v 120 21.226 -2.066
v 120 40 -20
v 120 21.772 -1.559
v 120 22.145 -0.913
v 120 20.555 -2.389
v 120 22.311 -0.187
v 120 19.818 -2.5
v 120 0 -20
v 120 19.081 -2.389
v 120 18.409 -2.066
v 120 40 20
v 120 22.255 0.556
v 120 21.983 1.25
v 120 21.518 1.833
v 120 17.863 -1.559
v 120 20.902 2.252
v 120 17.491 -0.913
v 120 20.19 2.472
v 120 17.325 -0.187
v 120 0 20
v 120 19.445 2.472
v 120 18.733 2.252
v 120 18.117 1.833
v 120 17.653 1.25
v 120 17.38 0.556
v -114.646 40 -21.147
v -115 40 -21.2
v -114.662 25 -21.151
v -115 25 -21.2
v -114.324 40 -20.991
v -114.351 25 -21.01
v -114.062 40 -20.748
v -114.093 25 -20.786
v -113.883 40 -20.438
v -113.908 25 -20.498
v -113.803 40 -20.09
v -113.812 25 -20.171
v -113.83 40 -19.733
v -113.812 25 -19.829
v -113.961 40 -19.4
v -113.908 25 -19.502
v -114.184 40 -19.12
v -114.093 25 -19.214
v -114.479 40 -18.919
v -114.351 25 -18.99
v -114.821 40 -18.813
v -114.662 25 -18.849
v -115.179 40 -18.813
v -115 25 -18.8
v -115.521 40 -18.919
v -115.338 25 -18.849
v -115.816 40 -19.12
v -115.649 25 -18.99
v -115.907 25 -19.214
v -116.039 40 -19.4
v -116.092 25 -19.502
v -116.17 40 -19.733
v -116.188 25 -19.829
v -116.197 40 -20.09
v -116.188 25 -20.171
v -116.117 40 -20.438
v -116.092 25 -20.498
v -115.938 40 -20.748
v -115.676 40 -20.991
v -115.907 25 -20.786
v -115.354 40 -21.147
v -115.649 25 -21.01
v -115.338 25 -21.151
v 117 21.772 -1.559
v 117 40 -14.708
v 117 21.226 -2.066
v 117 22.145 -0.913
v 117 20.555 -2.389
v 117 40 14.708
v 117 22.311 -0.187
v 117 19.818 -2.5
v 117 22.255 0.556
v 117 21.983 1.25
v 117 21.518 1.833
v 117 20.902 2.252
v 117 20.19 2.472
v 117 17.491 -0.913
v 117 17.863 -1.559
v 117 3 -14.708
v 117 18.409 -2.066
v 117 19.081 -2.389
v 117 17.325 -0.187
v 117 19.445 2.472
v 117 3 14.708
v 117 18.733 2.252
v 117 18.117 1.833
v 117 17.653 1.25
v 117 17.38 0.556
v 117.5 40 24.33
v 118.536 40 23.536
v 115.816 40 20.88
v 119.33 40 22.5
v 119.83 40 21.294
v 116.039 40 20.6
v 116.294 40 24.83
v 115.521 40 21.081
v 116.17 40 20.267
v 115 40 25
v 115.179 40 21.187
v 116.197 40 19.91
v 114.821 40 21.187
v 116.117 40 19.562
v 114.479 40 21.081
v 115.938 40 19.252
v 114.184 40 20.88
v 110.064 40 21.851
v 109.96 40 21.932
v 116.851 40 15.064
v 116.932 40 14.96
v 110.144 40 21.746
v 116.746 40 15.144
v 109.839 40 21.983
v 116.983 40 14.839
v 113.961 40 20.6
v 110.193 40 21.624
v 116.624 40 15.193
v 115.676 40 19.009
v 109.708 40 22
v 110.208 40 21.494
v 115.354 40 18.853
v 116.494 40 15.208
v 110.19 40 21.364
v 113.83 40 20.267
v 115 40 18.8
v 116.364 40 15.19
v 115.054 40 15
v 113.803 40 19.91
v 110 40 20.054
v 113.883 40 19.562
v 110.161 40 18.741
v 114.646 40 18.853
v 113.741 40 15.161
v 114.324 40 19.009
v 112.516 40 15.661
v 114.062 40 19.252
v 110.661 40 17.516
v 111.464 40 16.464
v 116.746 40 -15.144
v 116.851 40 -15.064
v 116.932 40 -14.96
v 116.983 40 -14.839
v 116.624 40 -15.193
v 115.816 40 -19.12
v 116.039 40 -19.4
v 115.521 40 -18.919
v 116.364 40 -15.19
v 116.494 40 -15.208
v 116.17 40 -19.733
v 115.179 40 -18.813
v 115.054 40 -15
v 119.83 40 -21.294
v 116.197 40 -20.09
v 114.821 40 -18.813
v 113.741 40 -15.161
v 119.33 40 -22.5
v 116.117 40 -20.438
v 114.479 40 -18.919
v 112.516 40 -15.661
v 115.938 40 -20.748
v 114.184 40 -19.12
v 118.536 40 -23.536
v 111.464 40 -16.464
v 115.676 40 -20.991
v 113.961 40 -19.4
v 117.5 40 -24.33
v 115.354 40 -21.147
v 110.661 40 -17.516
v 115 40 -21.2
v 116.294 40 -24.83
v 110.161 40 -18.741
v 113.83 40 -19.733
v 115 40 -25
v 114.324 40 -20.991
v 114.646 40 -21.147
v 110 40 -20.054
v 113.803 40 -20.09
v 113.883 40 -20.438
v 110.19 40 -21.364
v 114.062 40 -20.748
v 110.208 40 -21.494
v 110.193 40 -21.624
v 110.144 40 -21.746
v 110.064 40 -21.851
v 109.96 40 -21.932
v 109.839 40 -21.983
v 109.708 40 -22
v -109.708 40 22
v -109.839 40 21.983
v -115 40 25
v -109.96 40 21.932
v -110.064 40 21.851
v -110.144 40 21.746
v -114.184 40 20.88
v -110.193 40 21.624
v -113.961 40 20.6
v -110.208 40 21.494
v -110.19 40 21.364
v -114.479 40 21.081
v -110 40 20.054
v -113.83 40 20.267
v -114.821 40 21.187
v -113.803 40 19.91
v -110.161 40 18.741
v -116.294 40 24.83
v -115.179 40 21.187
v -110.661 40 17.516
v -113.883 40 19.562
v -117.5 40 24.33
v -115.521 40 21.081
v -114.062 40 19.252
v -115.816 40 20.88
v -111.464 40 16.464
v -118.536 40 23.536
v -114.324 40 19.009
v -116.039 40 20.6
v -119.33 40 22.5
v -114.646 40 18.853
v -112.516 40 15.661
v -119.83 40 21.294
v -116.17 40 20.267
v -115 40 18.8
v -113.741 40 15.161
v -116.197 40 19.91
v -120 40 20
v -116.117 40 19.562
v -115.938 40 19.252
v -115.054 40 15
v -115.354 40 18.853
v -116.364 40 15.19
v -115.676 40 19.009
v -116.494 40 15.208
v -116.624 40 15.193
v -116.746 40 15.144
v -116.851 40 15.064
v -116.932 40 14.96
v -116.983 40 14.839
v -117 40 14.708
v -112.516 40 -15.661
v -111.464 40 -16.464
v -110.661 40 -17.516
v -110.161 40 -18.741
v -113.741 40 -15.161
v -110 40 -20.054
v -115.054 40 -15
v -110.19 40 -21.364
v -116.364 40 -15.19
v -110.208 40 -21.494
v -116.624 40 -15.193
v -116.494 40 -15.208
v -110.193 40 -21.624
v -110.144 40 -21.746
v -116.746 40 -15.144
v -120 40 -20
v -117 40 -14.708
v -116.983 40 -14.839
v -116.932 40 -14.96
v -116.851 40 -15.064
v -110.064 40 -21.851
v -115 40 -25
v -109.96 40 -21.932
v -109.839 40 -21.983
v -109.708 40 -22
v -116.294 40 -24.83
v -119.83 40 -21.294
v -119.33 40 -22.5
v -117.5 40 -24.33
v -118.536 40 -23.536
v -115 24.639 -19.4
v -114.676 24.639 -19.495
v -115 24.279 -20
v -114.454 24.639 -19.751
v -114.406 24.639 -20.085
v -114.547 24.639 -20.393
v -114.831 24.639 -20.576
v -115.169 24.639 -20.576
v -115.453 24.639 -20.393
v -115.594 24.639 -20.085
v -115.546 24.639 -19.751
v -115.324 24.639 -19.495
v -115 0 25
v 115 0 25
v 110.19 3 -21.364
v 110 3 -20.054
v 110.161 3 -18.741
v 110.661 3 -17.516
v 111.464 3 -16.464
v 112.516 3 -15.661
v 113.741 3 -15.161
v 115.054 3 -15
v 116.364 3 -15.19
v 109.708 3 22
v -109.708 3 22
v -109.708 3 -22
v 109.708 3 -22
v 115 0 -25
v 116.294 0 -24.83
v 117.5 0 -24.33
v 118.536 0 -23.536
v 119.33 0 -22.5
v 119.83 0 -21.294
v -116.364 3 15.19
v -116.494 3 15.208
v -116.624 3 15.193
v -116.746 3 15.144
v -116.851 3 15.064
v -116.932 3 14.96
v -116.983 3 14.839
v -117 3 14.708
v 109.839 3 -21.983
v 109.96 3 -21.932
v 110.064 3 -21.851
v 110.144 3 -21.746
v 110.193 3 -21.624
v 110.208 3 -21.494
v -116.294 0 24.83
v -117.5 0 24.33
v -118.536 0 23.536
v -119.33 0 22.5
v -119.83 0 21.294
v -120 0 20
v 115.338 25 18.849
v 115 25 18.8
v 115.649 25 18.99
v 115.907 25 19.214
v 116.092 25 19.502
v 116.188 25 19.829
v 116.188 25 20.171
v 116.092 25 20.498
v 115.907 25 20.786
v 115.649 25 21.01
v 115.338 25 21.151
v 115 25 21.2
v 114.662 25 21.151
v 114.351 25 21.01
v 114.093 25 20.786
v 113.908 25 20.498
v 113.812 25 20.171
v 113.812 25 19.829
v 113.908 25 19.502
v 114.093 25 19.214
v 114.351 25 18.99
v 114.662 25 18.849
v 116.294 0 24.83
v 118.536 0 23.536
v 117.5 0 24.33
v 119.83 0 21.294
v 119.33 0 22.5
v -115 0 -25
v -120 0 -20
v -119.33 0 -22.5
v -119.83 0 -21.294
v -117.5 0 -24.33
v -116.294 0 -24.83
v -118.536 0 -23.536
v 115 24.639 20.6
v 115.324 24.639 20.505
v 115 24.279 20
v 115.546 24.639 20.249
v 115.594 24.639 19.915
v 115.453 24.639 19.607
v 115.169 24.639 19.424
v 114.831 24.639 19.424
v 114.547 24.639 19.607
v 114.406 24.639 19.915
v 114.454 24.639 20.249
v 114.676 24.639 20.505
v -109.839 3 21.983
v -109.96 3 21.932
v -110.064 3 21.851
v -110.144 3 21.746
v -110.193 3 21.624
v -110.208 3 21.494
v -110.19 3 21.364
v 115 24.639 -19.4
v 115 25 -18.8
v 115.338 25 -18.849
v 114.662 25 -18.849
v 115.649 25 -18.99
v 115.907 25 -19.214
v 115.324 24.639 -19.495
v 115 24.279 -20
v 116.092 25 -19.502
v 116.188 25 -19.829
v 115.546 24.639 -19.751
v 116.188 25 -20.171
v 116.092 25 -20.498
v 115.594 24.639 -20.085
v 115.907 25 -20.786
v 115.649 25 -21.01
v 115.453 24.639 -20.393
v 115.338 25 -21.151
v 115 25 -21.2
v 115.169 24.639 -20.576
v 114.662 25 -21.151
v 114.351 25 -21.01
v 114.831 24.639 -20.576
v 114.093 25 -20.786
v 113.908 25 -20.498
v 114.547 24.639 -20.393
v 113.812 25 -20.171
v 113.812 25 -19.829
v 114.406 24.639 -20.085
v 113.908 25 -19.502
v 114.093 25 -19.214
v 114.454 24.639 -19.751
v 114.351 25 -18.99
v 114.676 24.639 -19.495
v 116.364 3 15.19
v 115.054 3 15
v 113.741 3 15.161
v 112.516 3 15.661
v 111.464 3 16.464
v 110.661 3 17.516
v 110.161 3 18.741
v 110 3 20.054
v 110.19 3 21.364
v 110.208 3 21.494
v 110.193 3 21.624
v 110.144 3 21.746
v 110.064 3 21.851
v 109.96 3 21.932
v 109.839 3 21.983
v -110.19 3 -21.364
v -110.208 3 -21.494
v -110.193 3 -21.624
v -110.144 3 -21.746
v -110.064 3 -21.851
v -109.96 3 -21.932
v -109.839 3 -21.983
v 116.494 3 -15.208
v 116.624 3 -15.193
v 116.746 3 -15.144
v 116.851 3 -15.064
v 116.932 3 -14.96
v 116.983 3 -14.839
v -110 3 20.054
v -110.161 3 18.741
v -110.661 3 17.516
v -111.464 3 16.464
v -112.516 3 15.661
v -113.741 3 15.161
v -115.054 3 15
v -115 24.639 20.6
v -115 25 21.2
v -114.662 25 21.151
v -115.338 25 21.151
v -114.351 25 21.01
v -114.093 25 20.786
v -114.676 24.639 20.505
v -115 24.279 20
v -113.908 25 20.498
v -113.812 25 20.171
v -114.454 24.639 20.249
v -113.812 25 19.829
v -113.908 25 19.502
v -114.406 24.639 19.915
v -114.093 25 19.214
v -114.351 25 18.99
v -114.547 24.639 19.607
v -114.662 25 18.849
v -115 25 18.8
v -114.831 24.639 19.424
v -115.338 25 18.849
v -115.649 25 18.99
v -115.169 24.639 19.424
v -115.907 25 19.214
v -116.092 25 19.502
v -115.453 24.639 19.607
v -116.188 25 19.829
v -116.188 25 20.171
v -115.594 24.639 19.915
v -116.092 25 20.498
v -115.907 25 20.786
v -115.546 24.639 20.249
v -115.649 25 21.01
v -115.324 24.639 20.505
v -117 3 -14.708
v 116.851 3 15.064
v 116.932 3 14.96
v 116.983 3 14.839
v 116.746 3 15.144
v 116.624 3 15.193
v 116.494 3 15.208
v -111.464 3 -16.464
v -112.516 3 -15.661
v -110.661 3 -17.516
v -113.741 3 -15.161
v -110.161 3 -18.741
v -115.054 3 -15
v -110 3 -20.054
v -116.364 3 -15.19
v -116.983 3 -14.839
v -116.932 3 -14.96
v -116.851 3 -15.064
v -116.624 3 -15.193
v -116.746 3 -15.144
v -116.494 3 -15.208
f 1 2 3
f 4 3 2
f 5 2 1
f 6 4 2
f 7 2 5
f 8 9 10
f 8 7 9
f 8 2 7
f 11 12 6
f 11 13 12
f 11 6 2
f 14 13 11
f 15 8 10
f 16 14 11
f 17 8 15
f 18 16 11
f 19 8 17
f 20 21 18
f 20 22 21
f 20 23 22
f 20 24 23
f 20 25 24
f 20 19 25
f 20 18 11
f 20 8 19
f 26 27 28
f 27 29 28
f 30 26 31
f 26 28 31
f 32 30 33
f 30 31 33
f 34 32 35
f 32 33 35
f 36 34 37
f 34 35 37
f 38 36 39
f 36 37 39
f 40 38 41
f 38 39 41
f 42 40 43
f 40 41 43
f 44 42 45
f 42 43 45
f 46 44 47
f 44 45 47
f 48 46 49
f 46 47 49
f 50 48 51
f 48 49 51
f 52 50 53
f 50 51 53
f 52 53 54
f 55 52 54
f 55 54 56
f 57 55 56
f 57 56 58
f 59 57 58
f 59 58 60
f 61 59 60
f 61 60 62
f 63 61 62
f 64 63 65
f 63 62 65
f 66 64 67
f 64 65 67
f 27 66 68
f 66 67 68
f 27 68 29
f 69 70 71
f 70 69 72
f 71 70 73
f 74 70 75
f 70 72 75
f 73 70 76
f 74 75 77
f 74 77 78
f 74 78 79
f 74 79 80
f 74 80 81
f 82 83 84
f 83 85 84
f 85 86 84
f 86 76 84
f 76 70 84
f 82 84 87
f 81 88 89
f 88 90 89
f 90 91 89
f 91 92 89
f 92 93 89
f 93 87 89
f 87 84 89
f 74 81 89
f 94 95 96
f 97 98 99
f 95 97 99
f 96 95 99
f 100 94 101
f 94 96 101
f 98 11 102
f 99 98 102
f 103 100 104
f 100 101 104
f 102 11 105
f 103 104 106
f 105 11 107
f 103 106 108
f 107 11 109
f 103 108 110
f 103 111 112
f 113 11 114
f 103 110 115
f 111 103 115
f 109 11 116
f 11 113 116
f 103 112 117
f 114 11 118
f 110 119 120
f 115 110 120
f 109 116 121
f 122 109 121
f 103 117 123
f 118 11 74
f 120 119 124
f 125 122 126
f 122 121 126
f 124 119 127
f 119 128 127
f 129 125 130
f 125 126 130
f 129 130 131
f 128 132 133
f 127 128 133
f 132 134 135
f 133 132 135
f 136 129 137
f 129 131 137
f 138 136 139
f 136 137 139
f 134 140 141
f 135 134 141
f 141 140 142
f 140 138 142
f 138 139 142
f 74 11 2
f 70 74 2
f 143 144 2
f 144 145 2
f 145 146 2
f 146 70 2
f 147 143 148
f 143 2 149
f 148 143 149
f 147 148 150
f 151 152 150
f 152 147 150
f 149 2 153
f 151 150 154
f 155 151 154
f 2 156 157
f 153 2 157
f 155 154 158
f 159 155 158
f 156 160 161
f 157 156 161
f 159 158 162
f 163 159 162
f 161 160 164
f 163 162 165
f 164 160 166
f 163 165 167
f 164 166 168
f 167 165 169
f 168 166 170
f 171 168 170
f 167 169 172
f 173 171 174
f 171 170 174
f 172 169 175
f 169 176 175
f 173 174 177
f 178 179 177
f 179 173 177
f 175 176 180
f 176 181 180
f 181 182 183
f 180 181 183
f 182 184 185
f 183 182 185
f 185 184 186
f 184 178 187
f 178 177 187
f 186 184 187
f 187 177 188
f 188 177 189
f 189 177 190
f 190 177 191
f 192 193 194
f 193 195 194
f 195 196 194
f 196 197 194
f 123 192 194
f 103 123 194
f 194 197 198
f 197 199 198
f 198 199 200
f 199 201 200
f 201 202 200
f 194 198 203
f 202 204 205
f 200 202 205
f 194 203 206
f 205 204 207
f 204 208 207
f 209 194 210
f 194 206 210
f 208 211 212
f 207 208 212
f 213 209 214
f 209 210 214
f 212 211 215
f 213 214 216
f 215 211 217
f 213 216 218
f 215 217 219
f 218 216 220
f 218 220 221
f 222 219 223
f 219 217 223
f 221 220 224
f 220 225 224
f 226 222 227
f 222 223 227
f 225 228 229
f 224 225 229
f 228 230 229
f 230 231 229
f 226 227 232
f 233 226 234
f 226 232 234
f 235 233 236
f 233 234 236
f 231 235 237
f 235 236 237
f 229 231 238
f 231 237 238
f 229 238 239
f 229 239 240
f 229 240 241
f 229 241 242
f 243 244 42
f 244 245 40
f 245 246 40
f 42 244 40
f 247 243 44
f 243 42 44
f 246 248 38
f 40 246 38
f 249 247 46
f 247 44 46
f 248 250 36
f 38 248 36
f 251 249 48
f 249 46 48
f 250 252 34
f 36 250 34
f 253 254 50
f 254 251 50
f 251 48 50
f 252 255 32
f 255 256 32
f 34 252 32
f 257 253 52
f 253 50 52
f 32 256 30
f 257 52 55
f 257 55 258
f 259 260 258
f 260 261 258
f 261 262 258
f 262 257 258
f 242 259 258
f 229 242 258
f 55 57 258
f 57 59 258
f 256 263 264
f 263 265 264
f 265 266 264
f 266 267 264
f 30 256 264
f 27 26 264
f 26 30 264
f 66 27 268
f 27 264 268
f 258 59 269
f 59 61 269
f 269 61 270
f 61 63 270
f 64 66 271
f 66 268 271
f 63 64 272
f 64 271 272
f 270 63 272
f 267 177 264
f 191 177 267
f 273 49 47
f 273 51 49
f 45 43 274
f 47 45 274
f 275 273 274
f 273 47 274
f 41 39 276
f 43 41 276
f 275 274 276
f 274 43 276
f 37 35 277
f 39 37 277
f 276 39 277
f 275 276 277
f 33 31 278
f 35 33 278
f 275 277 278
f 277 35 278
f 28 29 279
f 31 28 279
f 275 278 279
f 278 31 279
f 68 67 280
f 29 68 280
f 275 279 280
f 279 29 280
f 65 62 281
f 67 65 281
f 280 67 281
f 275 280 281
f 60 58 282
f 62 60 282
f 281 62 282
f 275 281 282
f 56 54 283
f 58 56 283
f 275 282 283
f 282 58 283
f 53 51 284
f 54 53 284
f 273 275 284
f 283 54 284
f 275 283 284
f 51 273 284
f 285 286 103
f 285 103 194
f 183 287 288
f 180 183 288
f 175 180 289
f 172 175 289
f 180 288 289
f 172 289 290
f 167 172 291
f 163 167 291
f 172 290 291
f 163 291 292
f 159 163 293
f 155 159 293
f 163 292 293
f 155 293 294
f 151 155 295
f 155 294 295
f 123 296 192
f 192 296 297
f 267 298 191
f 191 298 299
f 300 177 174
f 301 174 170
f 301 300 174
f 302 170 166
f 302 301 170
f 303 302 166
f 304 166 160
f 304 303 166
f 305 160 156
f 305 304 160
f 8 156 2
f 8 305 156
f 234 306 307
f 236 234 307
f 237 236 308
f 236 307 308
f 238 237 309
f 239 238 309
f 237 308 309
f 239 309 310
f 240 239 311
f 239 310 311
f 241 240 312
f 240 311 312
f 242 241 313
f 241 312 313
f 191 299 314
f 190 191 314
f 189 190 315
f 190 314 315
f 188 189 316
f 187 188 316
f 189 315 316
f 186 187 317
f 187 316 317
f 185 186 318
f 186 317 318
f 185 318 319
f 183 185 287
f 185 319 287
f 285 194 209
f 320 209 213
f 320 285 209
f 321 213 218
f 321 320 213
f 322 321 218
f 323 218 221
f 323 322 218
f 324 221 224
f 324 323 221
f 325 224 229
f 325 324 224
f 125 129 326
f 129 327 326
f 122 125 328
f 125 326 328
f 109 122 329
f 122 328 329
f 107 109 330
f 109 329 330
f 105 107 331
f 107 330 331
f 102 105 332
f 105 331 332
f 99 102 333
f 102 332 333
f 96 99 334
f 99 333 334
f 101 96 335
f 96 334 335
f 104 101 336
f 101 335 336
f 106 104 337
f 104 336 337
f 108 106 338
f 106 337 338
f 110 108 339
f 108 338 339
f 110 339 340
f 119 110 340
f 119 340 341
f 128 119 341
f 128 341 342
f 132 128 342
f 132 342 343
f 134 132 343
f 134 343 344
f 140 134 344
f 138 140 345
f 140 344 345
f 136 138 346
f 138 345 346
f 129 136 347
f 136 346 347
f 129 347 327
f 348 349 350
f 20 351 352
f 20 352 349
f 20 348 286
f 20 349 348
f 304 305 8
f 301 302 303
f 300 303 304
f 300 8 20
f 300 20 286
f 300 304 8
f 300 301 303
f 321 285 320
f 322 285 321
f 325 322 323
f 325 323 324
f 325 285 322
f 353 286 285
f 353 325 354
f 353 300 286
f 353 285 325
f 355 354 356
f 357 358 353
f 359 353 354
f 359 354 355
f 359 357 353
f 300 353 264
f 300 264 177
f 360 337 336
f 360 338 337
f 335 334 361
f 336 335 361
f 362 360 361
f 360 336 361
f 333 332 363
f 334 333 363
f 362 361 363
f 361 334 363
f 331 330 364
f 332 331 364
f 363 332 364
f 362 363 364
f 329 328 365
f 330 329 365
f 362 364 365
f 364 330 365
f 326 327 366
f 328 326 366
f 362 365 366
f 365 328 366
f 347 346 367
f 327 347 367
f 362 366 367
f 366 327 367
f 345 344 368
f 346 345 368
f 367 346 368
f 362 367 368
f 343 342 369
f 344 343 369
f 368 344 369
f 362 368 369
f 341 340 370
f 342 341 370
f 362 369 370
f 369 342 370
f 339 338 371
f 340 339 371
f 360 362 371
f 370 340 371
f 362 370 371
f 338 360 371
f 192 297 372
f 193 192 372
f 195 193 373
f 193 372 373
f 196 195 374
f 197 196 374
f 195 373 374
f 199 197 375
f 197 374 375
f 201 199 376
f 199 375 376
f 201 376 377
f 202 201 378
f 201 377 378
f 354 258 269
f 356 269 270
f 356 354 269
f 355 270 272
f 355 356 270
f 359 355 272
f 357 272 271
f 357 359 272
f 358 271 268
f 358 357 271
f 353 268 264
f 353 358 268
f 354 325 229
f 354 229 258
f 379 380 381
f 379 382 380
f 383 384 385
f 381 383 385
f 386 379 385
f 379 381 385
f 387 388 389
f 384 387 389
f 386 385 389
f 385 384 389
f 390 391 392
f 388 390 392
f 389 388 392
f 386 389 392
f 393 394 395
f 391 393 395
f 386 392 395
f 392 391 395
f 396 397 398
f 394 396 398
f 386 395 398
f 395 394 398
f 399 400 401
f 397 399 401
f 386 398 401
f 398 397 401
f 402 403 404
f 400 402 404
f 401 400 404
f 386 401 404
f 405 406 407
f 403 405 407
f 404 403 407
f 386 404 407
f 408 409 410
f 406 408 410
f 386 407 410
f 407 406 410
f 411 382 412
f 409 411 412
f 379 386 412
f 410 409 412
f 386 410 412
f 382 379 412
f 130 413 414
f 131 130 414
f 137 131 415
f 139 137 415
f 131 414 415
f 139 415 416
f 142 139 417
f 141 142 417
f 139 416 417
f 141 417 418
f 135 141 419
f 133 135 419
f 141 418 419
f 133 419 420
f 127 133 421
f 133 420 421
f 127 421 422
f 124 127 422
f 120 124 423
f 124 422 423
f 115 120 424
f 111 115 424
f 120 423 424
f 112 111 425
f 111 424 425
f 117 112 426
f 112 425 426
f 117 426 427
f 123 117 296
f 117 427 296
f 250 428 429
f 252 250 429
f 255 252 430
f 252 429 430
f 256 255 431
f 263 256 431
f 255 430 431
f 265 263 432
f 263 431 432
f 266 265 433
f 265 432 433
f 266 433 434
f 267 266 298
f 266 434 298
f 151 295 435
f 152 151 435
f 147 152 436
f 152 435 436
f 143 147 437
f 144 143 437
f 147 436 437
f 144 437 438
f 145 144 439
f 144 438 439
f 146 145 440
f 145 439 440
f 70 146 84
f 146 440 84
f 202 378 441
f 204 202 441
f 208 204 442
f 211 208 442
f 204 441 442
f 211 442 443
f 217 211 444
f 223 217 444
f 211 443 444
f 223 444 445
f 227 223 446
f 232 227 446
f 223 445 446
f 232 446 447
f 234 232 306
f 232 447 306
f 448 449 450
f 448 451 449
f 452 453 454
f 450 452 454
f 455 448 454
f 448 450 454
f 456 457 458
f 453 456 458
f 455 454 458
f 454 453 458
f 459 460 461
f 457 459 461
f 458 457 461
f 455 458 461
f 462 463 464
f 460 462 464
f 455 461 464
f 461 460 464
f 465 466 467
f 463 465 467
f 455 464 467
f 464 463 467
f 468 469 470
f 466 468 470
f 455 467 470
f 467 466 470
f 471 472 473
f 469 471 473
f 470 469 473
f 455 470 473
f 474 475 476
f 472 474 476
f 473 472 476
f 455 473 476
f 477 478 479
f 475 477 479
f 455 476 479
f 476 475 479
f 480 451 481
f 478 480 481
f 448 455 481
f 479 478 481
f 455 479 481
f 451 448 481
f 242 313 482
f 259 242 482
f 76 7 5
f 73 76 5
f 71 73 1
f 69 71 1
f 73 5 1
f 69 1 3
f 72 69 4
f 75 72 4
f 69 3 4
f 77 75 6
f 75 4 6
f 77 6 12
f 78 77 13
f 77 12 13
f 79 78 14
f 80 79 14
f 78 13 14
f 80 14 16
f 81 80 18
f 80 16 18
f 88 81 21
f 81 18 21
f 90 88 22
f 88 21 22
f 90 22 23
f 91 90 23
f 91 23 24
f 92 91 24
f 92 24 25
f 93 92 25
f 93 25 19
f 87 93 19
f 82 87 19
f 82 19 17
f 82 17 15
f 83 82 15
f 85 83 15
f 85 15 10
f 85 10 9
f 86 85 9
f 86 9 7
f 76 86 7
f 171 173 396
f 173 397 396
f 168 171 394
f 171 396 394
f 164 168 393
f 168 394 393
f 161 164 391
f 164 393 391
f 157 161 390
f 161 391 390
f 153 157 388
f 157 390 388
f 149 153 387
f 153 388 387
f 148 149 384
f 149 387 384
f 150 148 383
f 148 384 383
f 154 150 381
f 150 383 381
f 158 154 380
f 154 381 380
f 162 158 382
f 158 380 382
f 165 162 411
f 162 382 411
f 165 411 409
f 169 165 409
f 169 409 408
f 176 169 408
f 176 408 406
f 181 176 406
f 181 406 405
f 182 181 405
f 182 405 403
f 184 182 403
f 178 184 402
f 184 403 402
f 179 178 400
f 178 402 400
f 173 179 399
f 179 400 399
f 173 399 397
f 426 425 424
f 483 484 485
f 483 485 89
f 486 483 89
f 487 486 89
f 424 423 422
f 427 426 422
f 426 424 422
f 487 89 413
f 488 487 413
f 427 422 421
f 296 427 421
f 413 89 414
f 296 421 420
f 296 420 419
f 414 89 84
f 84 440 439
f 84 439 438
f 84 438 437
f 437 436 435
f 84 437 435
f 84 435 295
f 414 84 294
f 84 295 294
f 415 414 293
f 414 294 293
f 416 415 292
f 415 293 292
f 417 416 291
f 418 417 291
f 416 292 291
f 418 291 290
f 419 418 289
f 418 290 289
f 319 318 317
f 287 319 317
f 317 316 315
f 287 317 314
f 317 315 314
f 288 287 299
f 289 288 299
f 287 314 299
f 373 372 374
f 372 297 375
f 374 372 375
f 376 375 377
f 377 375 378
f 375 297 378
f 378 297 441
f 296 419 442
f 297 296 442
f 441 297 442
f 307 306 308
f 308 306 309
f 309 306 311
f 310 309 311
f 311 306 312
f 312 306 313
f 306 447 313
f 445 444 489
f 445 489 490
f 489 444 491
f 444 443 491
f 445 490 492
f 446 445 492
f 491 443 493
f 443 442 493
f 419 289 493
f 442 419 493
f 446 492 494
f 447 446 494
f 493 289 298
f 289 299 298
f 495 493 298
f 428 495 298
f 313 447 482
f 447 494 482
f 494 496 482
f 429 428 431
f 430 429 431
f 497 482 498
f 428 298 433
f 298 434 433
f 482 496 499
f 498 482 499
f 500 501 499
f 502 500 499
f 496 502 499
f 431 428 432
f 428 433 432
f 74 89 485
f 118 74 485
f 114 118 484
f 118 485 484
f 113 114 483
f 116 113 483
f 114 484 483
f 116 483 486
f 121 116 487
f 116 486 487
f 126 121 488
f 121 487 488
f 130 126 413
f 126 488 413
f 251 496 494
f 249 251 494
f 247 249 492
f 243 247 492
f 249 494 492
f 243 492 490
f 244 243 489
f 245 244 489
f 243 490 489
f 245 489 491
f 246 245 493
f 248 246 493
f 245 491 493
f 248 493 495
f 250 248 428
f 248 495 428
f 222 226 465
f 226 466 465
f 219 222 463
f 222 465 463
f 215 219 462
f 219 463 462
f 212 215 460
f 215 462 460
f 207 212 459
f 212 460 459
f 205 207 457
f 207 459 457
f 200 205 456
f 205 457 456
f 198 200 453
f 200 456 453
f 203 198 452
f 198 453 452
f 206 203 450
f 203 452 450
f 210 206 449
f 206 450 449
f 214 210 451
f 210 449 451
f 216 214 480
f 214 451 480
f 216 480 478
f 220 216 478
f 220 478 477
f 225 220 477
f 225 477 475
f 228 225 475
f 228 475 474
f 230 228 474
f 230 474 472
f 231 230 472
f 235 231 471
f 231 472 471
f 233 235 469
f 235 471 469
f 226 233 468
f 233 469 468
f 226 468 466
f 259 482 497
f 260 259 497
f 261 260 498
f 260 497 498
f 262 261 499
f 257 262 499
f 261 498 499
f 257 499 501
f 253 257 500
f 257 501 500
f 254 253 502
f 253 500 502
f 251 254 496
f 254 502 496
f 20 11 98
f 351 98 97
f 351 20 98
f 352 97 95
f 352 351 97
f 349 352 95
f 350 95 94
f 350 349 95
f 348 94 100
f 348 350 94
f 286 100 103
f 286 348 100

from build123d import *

# Parameters (mm, degrees)
BOSS_EXTRUDE1_DEPTH      = 40
CUT_EXTRUDE1_START       = -37
CUT_EXTRUDE1_DEPTH       = 37
M2_CLEARANCE_HOLE1_D     = 2.4
M2_CLEARANCE_HOLE1_DEPTH = 15
M2_CLEARANCE_HOLE1_TIP   = 0.721032743
SKETCH7_R                = 2.5
CUT_EXTRUDE2_DEPTH       = 7


with BuildPart() as part:
    # Sketch1 → Boss-Extrude1 (new body)
    with BuildSketch(Plane(origin=(0, 0, 0), x_dir=(1, 0, 0), z_dir=(0, 1, 0))):
        with BuildLine():
            Line((-115, 25), (115, 25))
            ThreePointArc((115, 25), (118.535533906, 23.535533906), (120, 20))
            Line((120, 20), (120, -20))
            ThreePointArc((120, -20), (118.535533906, -23.535533906), (115, -25))
            Line((115, -25), (-115, -25))
            ThreePointArc((-115, -25), (-118.535533906, -23.535533906), (-120, -20))
            Line((-120, -20), (-120, 20))
            ThreePointArc((-120, 20), (-118.535533906, 23.535533906), (-115, 25))
        make_face()
    extrude(amount=BOSS_EXTRUDE1_DEPTH)

    # Sketch2 → Cut-Extrude1 (cut)
    with BuildSketch(Plane(origin=(0, 40, 0), x_dir=(1, 0, 0), z_dir=(0, 1, 0)).offset(CUT_EXTRUDE1_START)):
        with BuildLine():
            ThreePointArc((110.189543071, 21.363636364), (111.464466094, 16.464466094), (116.363636364, 15.189543071))
            ThreePointArc((116.363636364, 15.189543071), (116.801511345, 15.107359395), (117, 14.708497378))
            Line((117, 14.708497378), (117, -14.708497378))
            ThreePointArc((117, -14.708497378), (116.801511345, -15.107359395), (116.363636364, -15.189543071))
            ThreePointArc((116.363636364, -15.189543071), (111.464466094, -16.464466094), (110.189543071, -21.363636364))
            ThreePointArc((110.189543071, -21.363636364), (110.107359395, -21.801511345), (109.708497378, -22))
            Line((109.708497378, -22), (-109.708497378, -22))
            ThreePointArc((-109.708497378, -22), (-110.107359395, -21.801511345), (-110.189543071, -21.363636364))
            ThreePointArc((-110.189543071, -21.363636364), (-111.464466094, -16.464466094), (-116.363636364, -15.189543071))
            ThreePointArc((-116.363636364, -15.189543071), (-116.801511345, -15.107359395), (-117, -14.708497378))
            Line((-117, -14.708497378), (-117, 14.708497378))
            ThreePointArc((-117, 14.708497378), (-116.801511345, 15.107359395), (-116.363636364, 15.189543071))
            ThreePointArc((-116.363636364, 15.189543071), (-111.464466094, 16.464466094), (-110.189543071, 21.363636364))
            ThreePointArc((-110.189543071, 21.363636364), (-110.107359395, 21.801511345), (-109.708497378, 22))
            Line((-109.708497378, 22), (109.708497378, 22))
            ThreePointArc((109.708497378, 22), (110.107359395, 21.801511345), (110.189543071, 21.363636364))
        make_face()
    extrude(amount=CUT_EXTRUDE1_DEPTH, mode=Mode.SUBTRACT)

    # M2 Clearance Hole1
    with Locations(Plane(origin=(-115, 40, -20), x_dir=(0, 0, 1), z_dir=(0, 1, 0))):
        with Locations((0, 0), (40, 0), (40, 230), (0, 230)):
            Hole(M2_CLEARANCE_HOLE1_D / 2, depth=M2_CLEARANCE_HOLE1_DEPTH)
            with Locations((0, 0, -(M2_CLEARANCE_HOLE1_DEPTH + M2_CLEARANCE_HOLE1_TIP / 2))):  # 118° drill point
                Cone(0, M2_CLEARANCE_HOLE1_D / 2, M2_CLEARANCE_HOLE1_TIP, mode=Mode.SUBTRACT)

    # Sketch7 → Cut-Extrude2 (cut)
    with BuildSketch(Plane(origin=(120, 0, 0), x_dir=(0, 0, -1), z_dir=(1, 0, 0))):
        with Locations((0, 19.817767005)):
            Circle(SKETCH7_R)
    extrude(amount=-CUT_EXTRUDE2_DEPTH, mode=Mode.SUBTRACT)


solid = part.part
